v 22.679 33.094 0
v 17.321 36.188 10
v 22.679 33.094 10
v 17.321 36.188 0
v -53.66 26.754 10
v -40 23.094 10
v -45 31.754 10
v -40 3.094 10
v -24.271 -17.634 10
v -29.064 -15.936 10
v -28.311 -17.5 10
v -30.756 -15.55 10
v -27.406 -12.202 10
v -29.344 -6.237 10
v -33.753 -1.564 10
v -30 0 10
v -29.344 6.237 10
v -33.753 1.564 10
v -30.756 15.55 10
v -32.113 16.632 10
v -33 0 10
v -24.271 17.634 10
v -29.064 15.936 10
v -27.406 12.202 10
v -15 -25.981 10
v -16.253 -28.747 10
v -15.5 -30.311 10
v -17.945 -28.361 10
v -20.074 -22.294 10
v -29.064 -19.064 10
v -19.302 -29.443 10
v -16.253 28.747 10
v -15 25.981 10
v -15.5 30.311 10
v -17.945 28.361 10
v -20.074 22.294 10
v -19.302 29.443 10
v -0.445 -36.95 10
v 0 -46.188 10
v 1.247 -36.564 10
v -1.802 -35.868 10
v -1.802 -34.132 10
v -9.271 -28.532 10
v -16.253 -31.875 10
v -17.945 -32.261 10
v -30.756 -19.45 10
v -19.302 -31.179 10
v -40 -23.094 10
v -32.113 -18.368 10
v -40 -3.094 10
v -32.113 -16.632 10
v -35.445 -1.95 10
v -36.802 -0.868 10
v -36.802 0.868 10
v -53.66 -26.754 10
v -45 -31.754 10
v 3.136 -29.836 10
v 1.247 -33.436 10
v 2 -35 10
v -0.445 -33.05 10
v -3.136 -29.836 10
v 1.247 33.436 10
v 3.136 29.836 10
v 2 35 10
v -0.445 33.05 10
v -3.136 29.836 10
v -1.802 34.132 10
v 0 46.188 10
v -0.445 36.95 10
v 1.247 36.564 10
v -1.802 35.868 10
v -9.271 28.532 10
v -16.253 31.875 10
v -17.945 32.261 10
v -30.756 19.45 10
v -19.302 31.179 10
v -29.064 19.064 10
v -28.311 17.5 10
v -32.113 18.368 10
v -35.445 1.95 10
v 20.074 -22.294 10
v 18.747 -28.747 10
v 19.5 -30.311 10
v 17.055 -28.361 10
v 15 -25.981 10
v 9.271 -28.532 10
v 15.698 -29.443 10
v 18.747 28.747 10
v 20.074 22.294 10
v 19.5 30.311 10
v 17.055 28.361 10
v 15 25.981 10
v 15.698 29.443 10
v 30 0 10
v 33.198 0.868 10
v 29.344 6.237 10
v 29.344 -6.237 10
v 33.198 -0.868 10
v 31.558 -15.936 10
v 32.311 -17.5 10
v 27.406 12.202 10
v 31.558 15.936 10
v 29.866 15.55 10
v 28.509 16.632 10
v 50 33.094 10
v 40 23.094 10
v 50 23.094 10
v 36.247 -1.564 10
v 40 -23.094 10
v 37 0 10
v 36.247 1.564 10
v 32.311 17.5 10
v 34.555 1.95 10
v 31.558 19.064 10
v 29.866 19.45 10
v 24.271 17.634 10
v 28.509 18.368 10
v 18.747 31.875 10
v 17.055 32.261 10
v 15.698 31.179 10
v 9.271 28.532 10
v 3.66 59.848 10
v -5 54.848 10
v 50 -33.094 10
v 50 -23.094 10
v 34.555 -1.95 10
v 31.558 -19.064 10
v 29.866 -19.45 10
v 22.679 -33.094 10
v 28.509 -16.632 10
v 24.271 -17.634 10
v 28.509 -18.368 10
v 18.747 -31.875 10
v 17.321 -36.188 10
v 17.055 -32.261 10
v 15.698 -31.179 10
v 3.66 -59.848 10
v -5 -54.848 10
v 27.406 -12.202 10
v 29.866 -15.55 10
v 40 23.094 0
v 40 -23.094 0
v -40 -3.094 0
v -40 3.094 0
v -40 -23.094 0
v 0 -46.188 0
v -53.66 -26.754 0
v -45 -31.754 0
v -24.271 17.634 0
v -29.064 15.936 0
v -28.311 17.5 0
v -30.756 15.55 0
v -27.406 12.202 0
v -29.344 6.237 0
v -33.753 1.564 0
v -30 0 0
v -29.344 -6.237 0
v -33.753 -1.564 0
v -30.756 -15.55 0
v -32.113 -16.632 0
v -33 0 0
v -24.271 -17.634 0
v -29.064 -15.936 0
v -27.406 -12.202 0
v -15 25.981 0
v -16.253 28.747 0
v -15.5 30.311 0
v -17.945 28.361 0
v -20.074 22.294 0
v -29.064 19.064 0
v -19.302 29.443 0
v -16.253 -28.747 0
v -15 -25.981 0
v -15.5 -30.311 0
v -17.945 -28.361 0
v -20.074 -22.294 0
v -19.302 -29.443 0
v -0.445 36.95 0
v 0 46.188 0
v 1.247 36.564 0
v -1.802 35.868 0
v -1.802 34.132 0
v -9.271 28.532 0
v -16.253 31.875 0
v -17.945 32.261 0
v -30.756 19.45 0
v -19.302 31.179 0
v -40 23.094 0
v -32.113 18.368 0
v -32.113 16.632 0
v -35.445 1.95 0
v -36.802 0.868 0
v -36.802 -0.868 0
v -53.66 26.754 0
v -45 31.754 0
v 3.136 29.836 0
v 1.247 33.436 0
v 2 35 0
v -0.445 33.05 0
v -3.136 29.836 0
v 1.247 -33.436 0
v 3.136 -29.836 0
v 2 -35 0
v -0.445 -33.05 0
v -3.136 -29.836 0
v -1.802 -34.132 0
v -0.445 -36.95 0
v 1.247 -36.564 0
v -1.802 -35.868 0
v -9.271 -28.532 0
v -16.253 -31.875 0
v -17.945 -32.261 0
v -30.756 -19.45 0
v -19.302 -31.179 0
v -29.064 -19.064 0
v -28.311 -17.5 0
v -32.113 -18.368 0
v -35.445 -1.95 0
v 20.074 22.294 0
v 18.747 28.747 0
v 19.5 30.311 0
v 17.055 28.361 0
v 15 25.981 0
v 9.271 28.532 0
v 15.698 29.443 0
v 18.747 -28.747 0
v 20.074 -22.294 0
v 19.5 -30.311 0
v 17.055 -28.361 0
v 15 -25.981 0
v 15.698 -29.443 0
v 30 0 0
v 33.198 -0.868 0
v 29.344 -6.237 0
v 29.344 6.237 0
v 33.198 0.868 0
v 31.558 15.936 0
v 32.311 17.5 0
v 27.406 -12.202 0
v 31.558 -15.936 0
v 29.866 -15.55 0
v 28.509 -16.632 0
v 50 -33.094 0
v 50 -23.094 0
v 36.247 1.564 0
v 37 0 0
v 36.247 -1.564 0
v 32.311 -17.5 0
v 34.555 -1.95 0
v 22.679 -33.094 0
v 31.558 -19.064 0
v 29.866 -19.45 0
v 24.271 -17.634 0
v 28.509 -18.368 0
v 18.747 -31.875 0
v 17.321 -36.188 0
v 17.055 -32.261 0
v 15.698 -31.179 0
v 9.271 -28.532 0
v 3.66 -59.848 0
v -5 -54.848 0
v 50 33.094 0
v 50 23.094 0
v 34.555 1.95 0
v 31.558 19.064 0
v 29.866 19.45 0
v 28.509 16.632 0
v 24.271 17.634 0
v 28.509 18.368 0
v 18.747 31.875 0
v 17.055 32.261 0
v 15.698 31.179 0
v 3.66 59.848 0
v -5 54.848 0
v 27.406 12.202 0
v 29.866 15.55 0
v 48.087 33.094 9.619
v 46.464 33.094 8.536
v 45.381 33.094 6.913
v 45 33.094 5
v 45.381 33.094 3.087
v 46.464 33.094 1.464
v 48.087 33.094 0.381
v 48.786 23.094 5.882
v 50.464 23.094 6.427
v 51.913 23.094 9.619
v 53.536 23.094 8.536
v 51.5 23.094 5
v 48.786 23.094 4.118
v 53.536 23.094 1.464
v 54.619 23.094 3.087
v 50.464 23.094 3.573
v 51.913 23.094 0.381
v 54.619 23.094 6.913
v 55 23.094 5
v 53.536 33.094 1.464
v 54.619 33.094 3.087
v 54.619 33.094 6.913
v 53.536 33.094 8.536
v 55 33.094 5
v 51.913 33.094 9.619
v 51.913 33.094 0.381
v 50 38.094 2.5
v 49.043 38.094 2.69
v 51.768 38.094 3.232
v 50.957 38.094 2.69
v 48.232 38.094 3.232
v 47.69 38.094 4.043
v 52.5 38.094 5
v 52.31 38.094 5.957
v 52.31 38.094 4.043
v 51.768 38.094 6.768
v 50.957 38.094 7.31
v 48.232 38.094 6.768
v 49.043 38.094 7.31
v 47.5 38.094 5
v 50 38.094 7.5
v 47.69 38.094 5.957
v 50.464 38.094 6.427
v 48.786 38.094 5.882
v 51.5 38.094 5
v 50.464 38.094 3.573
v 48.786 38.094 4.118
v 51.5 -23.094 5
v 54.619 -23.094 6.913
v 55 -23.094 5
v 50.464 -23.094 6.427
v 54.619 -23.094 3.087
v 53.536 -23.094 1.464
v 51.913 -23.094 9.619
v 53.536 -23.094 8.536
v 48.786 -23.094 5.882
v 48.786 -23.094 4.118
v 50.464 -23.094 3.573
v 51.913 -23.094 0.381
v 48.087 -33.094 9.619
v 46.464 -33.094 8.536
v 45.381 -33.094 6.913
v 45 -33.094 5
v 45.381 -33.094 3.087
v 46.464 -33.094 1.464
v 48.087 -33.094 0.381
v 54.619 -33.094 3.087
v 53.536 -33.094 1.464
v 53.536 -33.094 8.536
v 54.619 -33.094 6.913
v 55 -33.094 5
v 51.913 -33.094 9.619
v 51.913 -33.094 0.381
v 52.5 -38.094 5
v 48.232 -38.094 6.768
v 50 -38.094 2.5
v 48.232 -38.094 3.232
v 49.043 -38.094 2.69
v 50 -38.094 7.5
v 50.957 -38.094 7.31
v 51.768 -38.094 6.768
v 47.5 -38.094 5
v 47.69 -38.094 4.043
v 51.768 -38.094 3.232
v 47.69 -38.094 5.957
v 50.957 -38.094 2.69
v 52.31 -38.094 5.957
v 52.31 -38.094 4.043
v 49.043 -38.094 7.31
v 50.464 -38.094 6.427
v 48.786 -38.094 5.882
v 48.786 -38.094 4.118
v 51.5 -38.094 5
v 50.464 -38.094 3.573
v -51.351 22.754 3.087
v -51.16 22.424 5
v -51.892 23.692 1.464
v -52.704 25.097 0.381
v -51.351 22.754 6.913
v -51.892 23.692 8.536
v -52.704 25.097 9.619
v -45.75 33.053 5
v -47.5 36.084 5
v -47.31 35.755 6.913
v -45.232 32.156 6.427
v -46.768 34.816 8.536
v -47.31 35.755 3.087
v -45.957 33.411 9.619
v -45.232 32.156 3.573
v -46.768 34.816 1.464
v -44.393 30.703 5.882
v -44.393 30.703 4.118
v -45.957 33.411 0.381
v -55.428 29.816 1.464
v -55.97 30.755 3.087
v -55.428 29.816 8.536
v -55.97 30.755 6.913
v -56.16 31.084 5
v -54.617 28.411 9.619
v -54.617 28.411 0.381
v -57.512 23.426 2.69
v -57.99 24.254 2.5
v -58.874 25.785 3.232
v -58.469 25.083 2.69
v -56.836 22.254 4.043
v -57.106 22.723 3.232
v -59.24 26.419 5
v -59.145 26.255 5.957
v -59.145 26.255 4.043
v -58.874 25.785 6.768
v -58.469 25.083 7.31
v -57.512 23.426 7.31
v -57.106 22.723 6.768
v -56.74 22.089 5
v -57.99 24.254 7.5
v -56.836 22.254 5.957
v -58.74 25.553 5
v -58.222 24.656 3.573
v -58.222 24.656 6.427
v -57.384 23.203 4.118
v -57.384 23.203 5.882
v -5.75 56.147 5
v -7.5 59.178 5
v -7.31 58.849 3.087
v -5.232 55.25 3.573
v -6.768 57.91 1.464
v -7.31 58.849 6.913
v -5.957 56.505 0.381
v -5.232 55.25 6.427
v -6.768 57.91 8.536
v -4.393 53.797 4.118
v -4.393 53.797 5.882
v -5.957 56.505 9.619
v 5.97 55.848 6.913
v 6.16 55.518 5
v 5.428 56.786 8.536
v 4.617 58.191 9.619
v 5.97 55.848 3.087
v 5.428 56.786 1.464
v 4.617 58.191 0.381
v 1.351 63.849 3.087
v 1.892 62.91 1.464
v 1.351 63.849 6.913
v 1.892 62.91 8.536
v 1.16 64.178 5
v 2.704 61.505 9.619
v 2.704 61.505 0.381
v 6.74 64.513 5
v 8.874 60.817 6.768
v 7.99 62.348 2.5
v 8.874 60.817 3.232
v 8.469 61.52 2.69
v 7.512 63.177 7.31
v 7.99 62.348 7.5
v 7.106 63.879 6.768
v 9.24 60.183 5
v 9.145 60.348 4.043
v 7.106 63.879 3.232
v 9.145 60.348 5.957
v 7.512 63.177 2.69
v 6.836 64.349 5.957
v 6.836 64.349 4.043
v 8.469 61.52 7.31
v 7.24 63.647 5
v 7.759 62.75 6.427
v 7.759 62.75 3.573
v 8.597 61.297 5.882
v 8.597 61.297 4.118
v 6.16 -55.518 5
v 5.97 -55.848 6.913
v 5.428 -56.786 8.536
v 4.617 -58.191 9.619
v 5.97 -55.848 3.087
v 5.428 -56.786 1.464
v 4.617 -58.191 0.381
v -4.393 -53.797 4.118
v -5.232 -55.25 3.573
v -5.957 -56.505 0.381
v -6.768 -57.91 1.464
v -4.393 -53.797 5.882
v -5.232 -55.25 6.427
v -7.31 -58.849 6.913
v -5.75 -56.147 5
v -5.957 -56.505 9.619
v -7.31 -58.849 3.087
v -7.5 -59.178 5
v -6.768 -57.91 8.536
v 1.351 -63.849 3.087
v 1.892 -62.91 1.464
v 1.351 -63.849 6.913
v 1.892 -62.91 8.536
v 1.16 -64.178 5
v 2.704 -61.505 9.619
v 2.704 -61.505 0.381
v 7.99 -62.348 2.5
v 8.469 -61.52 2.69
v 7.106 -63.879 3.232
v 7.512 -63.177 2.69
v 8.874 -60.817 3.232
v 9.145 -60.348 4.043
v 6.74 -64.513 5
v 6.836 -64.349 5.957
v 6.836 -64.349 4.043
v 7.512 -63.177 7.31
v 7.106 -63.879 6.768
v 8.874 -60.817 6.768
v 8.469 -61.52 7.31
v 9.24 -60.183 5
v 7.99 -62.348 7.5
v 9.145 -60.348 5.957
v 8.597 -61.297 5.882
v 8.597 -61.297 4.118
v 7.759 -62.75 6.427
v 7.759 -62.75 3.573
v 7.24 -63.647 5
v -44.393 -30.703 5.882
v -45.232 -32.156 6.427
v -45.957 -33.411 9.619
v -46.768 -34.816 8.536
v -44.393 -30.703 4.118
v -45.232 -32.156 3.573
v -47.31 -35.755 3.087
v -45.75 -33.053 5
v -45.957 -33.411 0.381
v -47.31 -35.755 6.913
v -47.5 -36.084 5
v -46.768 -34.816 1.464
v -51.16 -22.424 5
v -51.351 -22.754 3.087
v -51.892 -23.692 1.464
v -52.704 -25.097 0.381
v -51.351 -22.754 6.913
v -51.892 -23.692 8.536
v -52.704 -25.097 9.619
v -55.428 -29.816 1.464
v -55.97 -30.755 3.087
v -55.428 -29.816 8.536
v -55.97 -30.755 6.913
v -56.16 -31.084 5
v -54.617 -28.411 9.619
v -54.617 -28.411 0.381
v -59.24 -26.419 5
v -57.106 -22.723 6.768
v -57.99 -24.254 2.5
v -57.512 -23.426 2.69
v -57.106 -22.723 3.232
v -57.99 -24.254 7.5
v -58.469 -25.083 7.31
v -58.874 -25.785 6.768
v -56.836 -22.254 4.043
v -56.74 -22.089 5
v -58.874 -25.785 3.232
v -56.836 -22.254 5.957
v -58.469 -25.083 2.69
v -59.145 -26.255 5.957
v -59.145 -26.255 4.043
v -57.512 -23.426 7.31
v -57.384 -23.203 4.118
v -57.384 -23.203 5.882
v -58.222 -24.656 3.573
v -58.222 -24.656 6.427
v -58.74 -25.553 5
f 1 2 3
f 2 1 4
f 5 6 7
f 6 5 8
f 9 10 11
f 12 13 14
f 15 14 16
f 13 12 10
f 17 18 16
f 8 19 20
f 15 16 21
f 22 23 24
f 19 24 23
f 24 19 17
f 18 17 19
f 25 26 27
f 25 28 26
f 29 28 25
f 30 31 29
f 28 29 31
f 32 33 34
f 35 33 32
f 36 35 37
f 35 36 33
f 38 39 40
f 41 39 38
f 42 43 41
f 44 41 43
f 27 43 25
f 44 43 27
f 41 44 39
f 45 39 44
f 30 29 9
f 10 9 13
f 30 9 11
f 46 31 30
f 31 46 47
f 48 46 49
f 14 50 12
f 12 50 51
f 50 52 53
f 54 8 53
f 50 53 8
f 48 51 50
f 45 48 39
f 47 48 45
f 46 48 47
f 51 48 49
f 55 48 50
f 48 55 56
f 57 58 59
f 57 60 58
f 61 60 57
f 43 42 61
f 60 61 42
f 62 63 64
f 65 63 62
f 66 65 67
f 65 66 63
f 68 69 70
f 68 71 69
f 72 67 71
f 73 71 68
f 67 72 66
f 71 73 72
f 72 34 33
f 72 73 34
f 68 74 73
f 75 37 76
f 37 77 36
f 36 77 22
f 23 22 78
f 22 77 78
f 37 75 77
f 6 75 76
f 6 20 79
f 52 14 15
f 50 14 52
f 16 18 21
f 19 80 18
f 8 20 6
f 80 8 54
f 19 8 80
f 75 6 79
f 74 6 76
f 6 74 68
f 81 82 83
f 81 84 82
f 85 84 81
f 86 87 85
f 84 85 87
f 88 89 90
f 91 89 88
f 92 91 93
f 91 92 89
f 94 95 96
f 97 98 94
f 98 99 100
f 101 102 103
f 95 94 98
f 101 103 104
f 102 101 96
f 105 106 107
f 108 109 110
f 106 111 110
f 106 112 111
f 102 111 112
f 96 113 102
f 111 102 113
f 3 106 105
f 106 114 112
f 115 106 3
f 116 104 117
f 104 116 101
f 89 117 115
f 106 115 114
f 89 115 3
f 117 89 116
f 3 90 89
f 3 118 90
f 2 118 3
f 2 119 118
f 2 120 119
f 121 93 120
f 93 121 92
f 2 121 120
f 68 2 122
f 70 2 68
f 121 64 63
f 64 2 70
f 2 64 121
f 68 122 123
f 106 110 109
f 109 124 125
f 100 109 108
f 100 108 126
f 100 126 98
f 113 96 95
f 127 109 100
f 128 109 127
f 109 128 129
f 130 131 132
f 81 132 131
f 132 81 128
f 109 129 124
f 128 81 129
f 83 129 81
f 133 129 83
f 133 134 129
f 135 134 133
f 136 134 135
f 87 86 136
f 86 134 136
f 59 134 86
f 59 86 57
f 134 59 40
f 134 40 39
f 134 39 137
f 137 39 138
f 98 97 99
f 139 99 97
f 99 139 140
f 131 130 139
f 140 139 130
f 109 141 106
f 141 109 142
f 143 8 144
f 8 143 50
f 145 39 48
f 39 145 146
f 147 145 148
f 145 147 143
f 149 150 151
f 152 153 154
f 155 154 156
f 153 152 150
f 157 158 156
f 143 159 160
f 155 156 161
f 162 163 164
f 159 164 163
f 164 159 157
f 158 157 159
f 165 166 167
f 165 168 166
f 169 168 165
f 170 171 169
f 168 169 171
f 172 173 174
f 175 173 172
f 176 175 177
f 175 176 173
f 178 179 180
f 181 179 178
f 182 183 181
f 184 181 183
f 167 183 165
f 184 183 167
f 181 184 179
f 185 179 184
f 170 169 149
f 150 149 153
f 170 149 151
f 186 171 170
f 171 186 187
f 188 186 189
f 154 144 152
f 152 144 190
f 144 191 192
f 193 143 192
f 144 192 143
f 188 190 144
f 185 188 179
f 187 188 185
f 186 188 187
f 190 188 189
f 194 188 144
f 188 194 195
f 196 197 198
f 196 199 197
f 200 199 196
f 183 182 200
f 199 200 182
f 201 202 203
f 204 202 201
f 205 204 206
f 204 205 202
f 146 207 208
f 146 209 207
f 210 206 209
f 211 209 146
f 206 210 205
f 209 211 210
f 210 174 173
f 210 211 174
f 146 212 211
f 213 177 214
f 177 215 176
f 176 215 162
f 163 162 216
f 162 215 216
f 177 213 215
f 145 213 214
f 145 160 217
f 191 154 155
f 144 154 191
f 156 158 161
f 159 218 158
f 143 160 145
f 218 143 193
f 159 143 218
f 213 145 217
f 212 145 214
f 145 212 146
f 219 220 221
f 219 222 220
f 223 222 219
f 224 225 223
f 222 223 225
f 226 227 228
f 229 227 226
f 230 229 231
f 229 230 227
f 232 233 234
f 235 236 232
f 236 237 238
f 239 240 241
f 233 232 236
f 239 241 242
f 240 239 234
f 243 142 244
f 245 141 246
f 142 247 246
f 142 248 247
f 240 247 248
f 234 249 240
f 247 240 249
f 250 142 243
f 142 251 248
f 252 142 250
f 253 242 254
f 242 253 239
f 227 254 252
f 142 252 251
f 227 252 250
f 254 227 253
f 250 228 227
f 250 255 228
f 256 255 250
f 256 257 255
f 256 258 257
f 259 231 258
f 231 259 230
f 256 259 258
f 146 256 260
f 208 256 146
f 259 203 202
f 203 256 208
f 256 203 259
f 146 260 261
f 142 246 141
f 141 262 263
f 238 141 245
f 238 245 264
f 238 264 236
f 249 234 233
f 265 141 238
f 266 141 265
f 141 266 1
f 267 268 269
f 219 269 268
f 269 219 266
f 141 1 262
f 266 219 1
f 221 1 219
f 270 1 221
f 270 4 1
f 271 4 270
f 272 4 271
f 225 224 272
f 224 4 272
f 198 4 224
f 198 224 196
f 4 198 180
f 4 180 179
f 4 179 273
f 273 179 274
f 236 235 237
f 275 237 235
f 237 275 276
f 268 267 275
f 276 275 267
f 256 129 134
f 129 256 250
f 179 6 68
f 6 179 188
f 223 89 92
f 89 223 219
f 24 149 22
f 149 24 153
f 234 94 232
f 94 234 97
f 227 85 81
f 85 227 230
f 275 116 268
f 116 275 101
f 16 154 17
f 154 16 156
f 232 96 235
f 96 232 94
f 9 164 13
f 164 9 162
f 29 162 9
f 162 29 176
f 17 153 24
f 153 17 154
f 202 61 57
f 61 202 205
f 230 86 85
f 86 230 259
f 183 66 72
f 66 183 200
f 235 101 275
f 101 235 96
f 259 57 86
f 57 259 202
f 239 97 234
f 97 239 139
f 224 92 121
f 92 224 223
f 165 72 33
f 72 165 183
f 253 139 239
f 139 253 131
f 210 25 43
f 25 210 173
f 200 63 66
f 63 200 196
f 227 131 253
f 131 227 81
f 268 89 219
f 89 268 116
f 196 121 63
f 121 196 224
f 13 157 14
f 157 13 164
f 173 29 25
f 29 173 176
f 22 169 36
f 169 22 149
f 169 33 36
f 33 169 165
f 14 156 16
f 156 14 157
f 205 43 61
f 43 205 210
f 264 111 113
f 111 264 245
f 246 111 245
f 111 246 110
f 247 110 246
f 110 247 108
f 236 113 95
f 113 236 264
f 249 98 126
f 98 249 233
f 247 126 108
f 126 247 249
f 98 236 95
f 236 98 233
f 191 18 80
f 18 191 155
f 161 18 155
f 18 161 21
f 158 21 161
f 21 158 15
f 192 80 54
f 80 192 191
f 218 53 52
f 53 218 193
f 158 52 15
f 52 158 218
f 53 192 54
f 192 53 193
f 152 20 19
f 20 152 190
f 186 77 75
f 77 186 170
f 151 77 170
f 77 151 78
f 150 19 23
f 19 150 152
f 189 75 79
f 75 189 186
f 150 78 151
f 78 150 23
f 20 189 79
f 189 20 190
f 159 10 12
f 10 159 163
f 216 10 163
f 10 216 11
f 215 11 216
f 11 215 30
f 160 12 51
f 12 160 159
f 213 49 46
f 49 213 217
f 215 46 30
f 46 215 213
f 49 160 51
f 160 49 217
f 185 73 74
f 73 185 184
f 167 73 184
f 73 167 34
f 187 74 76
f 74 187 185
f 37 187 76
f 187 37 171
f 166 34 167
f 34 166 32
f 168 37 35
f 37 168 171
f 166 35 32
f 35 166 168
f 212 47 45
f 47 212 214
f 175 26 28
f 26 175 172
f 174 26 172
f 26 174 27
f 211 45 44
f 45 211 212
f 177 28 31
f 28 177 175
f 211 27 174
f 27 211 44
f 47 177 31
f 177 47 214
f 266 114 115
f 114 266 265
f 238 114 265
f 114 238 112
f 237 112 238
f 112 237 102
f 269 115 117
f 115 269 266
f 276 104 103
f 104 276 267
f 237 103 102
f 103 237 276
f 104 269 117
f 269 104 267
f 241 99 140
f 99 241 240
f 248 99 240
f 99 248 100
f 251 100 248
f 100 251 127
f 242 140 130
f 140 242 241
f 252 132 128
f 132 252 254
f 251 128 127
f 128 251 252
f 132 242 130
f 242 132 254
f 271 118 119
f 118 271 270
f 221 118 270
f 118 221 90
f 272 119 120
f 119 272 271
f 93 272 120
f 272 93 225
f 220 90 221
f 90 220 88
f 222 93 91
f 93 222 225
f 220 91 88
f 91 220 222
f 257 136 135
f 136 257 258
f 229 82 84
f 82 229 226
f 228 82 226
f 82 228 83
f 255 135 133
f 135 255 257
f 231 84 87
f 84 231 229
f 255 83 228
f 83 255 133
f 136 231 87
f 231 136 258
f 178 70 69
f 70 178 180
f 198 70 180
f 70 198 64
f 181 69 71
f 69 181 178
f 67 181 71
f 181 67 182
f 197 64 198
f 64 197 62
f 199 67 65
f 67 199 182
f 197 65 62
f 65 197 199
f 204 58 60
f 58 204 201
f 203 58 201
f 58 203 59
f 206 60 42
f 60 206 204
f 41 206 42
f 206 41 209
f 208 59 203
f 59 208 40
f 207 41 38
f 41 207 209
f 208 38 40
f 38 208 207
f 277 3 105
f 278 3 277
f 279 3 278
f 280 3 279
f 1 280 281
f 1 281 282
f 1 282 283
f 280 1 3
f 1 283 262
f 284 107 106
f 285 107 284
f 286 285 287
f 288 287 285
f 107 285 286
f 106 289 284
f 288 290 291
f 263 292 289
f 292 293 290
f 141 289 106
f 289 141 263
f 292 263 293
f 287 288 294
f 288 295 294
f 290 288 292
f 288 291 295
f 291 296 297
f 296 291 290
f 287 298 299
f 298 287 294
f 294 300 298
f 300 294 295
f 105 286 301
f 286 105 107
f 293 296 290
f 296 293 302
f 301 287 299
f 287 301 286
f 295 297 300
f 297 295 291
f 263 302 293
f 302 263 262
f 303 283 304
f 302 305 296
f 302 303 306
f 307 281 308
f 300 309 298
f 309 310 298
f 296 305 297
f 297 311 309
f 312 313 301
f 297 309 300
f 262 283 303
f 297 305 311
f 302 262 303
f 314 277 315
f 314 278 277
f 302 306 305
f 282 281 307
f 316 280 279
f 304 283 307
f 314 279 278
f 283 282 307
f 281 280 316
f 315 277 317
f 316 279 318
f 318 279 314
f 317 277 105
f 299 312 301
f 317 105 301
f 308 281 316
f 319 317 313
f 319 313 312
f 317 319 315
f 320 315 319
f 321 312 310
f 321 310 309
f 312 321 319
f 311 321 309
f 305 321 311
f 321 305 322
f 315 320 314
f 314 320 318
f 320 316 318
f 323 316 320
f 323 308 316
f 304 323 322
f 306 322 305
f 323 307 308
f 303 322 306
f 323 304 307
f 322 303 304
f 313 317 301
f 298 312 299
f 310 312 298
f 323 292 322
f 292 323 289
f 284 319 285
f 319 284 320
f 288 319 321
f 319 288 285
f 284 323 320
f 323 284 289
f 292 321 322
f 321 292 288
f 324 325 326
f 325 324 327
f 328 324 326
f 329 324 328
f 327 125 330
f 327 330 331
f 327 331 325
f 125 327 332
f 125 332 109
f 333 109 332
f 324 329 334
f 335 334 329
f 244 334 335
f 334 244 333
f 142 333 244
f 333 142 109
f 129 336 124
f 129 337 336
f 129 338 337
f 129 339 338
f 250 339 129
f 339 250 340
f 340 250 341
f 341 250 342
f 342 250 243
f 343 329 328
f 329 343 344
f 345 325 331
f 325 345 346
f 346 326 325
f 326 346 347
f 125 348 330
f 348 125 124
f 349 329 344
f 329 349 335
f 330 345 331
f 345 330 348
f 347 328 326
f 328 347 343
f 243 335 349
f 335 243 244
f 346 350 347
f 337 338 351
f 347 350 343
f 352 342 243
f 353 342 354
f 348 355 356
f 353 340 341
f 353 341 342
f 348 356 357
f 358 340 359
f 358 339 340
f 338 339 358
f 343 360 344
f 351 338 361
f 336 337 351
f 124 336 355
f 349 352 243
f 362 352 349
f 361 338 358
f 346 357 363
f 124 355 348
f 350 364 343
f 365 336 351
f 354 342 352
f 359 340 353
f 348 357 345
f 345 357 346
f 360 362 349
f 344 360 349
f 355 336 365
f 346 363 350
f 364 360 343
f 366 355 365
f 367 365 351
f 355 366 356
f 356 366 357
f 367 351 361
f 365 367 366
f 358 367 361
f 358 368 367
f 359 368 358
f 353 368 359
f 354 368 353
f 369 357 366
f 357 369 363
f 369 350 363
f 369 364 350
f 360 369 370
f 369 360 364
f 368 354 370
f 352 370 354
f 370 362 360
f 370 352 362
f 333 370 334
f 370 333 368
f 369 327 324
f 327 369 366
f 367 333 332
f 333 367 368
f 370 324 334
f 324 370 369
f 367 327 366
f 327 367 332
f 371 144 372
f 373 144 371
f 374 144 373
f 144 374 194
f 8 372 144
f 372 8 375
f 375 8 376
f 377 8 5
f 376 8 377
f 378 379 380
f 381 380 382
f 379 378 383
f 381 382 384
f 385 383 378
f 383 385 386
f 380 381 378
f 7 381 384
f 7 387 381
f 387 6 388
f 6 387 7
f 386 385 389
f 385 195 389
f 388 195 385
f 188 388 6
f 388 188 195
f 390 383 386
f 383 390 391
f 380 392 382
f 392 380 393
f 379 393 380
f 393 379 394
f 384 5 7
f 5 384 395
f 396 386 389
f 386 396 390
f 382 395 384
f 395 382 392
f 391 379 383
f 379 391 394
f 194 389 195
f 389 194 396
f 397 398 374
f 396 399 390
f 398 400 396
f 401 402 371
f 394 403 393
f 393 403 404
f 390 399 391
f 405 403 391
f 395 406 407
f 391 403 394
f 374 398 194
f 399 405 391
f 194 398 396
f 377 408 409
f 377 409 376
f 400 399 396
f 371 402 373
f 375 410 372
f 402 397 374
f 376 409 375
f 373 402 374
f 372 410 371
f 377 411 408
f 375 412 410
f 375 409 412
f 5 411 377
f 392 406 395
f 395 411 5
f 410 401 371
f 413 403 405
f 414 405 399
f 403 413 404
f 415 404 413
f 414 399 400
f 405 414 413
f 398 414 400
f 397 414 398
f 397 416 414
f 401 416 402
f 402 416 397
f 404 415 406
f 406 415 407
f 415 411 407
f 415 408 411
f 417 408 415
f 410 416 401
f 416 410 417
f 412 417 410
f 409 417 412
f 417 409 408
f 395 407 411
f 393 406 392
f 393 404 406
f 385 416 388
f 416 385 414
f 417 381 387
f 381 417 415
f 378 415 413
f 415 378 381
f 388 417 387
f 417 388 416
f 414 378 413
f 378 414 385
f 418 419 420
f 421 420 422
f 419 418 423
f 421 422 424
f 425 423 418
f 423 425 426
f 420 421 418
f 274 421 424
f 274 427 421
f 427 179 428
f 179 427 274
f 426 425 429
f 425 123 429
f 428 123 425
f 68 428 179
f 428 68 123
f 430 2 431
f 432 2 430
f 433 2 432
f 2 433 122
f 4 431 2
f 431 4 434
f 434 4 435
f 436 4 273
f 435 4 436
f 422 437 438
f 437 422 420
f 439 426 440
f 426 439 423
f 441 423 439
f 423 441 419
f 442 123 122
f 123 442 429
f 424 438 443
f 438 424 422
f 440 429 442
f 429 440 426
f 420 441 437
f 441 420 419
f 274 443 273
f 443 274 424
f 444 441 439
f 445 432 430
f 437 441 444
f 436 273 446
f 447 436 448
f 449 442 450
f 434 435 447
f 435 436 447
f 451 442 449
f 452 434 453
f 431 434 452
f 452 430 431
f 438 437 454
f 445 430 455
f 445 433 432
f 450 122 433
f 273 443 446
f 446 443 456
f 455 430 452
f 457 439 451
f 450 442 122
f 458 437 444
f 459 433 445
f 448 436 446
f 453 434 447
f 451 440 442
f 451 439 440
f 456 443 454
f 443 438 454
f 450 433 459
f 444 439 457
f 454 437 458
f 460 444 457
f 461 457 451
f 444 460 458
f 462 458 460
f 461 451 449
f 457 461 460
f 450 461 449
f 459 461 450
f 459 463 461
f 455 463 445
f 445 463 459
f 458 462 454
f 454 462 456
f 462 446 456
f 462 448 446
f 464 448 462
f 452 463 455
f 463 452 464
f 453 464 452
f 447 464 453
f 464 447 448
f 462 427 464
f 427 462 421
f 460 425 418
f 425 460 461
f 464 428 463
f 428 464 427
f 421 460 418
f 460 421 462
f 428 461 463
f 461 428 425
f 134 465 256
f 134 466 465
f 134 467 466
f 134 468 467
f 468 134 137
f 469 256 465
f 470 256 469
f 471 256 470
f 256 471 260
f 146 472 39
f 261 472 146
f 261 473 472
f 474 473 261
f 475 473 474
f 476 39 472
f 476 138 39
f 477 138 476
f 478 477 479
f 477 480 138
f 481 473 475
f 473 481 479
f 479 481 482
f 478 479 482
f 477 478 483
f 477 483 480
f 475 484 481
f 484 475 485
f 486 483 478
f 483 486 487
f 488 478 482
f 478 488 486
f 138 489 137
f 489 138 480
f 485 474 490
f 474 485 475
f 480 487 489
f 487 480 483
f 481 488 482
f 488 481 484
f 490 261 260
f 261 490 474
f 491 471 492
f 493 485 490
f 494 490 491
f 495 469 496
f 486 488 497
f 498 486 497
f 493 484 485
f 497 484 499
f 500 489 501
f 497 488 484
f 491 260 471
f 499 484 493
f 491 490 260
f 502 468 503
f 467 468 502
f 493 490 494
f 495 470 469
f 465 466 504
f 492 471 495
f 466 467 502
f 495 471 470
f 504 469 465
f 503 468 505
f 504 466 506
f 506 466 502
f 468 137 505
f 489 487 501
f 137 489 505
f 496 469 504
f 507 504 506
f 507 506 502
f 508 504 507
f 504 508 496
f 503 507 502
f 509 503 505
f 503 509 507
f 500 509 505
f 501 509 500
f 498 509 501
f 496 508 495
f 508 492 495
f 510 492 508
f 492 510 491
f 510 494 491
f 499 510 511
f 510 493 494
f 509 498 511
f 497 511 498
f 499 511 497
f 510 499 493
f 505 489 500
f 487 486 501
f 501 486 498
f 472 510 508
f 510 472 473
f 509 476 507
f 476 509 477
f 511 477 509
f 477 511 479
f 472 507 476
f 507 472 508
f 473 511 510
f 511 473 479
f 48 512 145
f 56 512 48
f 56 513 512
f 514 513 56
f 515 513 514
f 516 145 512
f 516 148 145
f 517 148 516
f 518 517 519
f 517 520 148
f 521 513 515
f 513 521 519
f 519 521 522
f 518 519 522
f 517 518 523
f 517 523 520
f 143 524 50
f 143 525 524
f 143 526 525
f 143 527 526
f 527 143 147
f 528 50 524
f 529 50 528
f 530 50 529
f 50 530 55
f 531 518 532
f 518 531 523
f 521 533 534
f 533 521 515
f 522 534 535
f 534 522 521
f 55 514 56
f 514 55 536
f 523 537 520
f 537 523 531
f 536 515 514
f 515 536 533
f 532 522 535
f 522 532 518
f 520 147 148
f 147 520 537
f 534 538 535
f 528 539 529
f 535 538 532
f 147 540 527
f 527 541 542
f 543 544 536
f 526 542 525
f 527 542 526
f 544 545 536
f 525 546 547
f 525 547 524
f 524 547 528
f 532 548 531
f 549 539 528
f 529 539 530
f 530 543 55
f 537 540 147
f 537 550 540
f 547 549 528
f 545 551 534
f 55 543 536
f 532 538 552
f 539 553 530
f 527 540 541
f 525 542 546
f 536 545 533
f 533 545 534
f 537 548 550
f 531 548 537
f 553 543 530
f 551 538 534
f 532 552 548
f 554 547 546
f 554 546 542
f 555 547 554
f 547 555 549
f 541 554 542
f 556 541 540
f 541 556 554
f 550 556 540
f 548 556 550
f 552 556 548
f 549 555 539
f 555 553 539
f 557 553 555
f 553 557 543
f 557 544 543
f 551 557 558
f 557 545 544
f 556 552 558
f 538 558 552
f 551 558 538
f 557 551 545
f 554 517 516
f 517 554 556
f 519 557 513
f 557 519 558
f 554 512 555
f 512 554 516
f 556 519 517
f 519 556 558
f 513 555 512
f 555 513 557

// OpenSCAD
H = 10;

R = 30;

thikness = 10;

base = R + thikness;

l = base*sqrt(3)/3;
L = sqrt(l*l + base*base);


r = 2;
r_base = R + thikness/2;
r_l = r_base/2;
r_L = sqrt(r_base*r_base - r_l*r_l);

r_bolt = 1.5;

difference() {
	
	// 6-angle 
	linear_extrude(height = H) {
		polygon(points=[ [base, -l], [base, l], [0, L], [-base, l], [-base, -l], [0, -L] ]);
	
	}
	{
		// Hole in center
		cylinder(h = H, r = R);

		translate([r_base, 0, 0]) cylinder(h = H, r = r);
		translate([-r_base, 0, 0]) cylinder(h = H, r = r);

		translate([-r_L, r_l, 0]) cylinder(h = H, r = r);
		translate([-r_L, -r_l, 0]) cylinder(h = H, r = r);

		translate([-r_l, r_L, 0]) cylinder(h = H, r = r);
		translate([-r_l, -r_L, 0]) cylinder(h = H, r = r);

		translate([r_L, r_l, 0]) cylinder(h = H, r = r);
		translate([r_L, -r_l, 0]) cylinder(h = H, r = r);

		translate([r_l, r_L, 0]) cylinder(h = H, r = r);
		translate([r_l, -r_L, 0]) cylinder(h = H, r = r);

		translate([0, r_base, 0]) cylinder(h = H, r = r);
		translate([0, -r_base, 0]) cylinder(h = H, r = r);
	}
}



A=10;
L2=30;

module mount(left=true) {
	  difference() {
		union() {
			cube(size=[L2, A, H], center=true);
			translate([L2/2, 0, 0]) rotate(a=90, v=[1,0,0]) cylinder(r=H/2, h=A, center=true);

			if (left) {
				translate([L2/2, A, 0]) rotate(a=90, v=[1,0,0]) cylinder(r2=H/2, r1=r_bolt+1, h=A/2);
			} else {
				translate([L2/2, -A/2, 0]) rotate(a=90, v=[1,0,0]) cylinder(r1=H/2, r2=r_bolt+1, h=A/2);
			}			
		}
		translate([L2/2, 0, 0]) rotate(a=90, v=[1,0,0]) cylinder(r=r_bolt, h=A*3, center=true);
	}
};

inside = false;

translate([base-A/2, l+A/2, A/2]) mount(!inside);
translate([base-A/2, -l-A/2, A/2]) mount(inside);

rotate(a=120, v=[0,0,1]) translate([base-A/2, l+A/2, A/2]) mount(!inside);
rotate(a=120, v=[0,0,1]) translate([base-A/2, -l-A/2, A/2]) mount(inside);

rotate(a=240, v=[0,0,1]) translate([base-A/2, l+A/2, A/2]) mount(!inside);
rotate(a=240, v=[0,0,1]) translate([base-A/2, -l-A/2, A/2]) mount(inside);
